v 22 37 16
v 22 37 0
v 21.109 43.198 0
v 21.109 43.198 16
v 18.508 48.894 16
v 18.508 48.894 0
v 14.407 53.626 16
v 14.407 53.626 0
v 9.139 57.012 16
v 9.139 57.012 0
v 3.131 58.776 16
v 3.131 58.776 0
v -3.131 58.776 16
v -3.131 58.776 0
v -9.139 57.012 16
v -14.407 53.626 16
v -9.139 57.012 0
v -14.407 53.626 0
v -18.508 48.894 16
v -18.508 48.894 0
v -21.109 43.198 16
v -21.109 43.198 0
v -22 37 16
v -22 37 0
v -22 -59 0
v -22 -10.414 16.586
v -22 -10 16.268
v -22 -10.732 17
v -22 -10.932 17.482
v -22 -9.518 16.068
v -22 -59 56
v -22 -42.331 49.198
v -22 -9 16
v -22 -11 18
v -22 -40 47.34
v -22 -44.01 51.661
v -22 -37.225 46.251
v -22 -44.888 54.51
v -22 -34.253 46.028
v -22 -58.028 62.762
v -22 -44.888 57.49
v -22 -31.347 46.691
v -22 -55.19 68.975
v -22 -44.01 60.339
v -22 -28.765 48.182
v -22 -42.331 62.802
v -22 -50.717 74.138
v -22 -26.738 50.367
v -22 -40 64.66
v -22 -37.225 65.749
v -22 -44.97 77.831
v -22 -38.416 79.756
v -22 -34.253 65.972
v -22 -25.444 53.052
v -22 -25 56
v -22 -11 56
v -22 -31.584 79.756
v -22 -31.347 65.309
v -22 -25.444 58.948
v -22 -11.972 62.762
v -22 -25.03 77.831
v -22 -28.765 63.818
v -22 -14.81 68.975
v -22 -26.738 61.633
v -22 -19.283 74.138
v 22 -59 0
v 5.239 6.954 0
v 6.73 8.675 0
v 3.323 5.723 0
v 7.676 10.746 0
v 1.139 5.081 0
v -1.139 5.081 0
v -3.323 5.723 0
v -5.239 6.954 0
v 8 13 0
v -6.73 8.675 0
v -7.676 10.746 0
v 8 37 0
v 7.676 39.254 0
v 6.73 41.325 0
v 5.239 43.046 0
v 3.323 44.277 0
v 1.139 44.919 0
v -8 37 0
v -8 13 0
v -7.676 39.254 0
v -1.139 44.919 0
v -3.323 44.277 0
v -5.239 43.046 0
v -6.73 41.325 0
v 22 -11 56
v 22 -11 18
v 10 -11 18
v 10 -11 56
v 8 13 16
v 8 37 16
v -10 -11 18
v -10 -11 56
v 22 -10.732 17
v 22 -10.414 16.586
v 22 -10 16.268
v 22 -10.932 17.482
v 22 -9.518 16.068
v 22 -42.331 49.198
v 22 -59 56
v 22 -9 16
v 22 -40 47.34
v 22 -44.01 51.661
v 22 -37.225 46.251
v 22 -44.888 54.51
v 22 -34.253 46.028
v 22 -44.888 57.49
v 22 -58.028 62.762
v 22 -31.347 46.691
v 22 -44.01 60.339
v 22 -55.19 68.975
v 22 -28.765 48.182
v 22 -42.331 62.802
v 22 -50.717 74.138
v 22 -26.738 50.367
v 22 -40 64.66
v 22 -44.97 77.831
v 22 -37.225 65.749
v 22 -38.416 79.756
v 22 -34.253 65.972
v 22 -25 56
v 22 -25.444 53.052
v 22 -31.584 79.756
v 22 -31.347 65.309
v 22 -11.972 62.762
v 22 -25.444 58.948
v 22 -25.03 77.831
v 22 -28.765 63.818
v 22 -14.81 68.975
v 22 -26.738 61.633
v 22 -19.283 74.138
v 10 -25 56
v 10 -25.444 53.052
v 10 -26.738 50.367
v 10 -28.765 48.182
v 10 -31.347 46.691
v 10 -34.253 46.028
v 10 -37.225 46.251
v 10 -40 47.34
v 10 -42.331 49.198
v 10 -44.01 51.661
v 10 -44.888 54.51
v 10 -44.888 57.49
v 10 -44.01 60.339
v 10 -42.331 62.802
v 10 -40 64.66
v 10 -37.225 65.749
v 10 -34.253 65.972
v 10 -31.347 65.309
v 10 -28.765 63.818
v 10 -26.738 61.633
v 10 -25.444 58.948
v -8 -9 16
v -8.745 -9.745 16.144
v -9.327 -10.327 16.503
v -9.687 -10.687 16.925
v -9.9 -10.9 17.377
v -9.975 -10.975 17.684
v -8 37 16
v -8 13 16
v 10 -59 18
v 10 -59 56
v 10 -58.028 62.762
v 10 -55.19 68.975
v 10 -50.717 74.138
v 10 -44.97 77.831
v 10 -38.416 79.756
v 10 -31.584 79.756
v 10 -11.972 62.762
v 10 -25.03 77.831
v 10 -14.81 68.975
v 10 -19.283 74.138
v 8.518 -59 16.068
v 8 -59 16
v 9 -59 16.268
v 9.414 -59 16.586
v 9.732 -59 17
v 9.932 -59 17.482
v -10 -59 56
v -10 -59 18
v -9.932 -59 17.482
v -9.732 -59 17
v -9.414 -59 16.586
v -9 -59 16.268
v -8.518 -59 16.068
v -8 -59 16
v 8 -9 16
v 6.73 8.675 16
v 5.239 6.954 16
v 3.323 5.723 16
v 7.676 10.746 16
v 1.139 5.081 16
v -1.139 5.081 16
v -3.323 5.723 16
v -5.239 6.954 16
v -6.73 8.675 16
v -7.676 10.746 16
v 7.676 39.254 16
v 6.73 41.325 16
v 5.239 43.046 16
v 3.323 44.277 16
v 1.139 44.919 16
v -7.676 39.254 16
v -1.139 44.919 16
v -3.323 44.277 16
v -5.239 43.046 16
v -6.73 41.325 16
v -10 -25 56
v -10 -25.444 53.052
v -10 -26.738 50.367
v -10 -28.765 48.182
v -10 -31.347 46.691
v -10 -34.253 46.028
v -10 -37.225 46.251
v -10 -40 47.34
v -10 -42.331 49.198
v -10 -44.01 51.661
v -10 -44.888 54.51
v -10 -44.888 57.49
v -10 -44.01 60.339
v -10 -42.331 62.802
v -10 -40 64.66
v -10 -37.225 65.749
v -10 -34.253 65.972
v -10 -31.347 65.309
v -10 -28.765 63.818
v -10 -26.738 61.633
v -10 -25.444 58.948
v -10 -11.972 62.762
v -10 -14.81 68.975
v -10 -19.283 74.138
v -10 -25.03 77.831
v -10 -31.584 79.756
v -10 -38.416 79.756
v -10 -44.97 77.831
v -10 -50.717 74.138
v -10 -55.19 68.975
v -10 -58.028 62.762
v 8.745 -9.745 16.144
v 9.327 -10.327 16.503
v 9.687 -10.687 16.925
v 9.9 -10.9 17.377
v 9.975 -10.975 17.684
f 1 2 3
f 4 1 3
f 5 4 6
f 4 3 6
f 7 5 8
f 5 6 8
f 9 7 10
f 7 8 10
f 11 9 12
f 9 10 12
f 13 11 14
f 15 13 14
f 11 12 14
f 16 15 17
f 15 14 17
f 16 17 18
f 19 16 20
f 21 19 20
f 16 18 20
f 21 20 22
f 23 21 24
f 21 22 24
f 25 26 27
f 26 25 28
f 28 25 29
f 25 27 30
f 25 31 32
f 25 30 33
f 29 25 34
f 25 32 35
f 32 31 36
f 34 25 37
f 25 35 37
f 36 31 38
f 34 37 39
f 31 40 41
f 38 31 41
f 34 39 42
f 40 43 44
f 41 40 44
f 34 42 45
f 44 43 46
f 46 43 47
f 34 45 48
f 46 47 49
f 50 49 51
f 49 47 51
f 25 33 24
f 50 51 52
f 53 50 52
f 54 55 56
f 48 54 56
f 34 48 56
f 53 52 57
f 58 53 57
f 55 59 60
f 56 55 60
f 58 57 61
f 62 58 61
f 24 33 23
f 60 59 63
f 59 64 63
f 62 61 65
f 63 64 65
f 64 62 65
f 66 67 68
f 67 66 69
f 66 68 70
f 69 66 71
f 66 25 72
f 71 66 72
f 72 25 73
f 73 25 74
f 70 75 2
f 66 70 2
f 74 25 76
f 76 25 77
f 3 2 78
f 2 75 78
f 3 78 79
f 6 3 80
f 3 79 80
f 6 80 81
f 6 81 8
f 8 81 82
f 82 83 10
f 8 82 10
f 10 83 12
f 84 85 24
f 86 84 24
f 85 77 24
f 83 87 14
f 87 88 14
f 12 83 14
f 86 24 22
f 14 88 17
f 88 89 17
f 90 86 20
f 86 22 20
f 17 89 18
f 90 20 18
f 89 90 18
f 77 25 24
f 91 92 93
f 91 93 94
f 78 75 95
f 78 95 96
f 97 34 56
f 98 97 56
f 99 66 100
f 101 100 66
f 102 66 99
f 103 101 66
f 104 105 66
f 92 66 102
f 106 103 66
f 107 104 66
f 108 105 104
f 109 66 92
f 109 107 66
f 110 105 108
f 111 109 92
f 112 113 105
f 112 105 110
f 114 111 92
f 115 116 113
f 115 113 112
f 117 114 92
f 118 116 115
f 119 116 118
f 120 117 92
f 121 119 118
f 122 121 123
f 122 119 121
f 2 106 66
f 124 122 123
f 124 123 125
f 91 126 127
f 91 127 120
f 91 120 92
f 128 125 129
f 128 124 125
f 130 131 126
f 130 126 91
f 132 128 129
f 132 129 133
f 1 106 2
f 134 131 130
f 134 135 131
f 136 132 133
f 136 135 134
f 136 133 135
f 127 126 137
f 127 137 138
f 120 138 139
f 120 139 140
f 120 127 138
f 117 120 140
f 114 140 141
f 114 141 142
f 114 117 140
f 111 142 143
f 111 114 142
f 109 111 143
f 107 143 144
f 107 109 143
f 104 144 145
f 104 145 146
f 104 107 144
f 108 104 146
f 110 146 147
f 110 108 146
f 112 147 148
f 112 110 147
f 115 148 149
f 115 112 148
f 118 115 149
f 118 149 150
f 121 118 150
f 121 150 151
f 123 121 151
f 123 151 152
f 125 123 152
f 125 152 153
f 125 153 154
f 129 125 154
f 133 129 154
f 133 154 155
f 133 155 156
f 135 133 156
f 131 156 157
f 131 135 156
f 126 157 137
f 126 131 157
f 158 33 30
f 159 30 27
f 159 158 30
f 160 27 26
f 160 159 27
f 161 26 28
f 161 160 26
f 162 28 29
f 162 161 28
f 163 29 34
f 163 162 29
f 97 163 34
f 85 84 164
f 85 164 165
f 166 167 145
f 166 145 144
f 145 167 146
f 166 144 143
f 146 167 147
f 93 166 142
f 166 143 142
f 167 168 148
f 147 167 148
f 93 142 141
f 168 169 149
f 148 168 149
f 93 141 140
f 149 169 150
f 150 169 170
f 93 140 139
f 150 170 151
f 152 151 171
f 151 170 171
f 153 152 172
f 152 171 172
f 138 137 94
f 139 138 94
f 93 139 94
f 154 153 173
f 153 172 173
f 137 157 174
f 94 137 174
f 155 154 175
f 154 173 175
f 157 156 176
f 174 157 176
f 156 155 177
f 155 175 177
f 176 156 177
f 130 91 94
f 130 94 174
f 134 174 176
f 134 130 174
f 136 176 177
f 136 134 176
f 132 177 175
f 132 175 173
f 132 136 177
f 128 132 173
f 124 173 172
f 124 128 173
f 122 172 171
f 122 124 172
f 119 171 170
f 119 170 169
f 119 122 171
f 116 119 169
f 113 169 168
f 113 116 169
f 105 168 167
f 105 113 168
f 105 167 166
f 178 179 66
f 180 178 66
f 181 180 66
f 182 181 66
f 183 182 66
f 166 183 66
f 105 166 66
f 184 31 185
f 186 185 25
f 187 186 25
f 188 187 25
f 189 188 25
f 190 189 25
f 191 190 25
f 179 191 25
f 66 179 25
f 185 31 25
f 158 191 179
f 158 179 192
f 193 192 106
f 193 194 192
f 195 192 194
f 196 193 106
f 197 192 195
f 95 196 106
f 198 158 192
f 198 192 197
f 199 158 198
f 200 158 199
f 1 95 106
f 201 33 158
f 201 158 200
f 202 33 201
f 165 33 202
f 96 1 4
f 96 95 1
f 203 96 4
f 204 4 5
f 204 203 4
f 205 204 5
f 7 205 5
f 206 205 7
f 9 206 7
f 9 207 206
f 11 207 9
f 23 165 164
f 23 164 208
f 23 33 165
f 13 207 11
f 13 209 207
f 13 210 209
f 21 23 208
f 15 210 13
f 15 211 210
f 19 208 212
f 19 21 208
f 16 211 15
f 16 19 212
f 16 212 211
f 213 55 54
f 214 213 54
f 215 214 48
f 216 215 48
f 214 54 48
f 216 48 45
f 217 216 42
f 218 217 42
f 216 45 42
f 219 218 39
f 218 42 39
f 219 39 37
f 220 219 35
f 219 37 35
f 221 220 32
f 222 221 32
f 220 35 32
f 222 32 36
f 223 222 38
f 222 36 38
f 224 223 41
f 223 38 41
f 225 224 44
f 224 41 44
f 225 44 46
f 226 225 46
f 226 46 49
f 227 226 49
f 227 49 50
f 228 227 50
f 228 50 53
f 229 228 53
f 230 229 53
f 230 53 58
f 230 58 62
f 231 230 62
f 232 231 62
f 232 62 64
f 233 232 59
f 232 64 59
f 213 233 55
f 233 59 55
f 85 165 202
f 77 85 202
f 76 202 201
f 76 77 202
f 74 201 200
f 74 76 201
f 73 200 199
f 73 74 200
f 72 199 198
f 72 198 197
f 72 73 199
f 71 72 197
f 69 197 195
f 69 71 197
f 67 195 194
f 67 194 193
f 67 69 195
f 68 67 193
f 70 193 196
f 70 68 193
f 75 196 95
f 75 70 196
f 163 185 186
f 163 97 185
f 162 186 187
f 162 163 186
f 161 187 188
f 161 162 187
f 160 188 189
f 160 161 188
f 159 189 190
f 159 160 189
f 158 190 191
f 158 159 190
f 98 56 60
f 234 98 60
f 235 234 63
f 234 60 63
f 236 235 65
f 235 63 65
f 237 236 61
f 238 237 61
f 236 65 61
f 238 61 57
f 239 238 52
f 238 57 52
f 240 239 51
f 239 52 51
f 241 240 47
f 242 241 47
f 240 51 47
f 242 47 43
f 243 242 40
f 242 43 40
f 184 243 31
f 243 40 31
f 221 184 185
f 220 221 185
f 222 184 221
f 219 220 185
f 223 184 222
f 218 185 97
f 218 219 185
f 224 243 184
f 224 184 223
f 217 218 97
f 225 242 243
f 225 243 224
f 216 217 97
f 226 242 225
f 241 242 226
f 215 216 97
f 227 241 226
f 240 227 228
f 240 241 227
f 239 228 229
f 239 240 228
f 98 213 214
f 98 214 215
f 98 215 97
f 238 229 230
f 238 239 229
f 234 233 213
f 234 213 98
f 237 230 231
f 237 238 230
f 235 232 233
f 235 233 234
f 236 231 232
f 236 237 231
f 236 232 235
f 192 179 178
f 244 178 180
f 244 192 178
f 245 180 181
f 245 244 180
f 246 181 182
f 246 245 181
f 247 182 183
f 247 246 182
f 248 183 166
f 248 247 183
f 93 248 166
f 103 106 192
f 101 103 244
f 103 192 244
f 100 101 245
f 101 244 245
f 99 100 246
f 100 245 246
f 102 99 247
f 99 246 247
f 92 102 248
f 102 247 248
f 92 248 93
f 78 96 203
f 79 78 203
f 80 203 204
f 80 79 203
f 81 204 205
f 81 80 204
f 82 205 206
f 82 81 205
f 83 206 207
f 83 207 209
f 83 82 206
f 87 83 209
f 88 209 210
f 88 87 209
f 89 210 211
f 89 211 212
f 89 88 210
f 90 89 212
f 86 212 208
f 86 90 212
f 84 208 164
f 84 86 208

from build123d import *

# Parameters (mm, degrees)
ESQUISSE1_R             = 22
BOSS_EXTRU_1_DEPTH      = 16
ENL_V_MAT_EXTRU_1_DEPTH = 16
BOSS_EXTRU_3_DEPTH      = 12
CONG_2_R                = 2


with BuildPart() as part:
    # Esquisse1 → Boss.-Extru.1 (new body)
    with BuildSketch(Plane(origin=(0, 0, 0), x_dir=(0, 1, 0), z_dir=(0, 0, 1))):
        with BuildLine():
            Line((-59, 22), (-59, -22))
            Line((-59, -22), (37, -22))
            ThreePointArc((37, -22), (15, 0), (37, 22))
            Line((37, 22), (-59, 22))
        make_face()
        with Locations((37, 0)):
            Circle(ESQUISSE1_R)
    extrude(amount=BOSS_EXTRU_1_DEPTH)

    # Esquisse2 → Enlèv. mat.-Extru.1 (cut)
    with BuildSketch(Plane(origin=(0, 0, 0), x_dir=(1, 0, 0), z_dir=(0, 0, -1))):
        with BuildLine():
            Line((-8, -37), (-8, -13))
            ThreePointArc((-8, -13), (0, -5), (8, -13))
            Line((8, -13), (8, -37))
            ThreePointArc((8, -37), (0, -45), (-8, -37))
        make_face()
    extrude(amount=-ENL_V_MAT_EXTRU_1_DEPTH, mode=Mode.SUBTRACT)

    # Esquisse3 → Boss.-Extru.3 (add)
    with BuildSketch(Plane.YZ.offset(22)):
        with BuildLine():
            Line((-59, 56), (-59, 16))
            Line((-59, 16), (-11, 16))
            Line((-11, 16), (-11, 56))
            ThreePointArc((-11, 56), (-35, 32), (-59, 56))
        make_face()
        with BuildLine():
            ThreePointArc((-11, 56), (-35, 80), (-59, 56))
            Line((-59, 56), (-45, 56))
            ThreePointArc((-45, 56), (-35, 66), (-25, 56))
            Line((-25, 56), (-11, 56))
        make_face()
        with BuildLine():
            Line((-45, 56), (-59, 56))
            ThreePointArc((-59, 56), (-35, 32), (-11, 56))
            Line((-11, 56), (-25, 56))
            ThreePointArc((-25, 56), (-35, 46), (-45, 56))
        make_face()
    boss_extru_3 = extrude(amount=-BOSS_EXTRU_3_DEPTH)

    # Symétrie1: Boss.-Extru.3 across plane
    add(boss_extru_3.mirror(Plane(origin=(0, 0, 0), x_dir=(0, 0, 1), z_dir=(1, 0, 0))))

    # Congé2
    cong_2_edges = [part.edges().sort_by_distance(p)[0] for p in [
        (16, -11, 16),
        (10, -35, 16),
        (-16, -11, 16),
        (-10, -35, 16),
    ]]
    fillet(cong_2_edges, radius=CONG_2_R)


solid = part.part
